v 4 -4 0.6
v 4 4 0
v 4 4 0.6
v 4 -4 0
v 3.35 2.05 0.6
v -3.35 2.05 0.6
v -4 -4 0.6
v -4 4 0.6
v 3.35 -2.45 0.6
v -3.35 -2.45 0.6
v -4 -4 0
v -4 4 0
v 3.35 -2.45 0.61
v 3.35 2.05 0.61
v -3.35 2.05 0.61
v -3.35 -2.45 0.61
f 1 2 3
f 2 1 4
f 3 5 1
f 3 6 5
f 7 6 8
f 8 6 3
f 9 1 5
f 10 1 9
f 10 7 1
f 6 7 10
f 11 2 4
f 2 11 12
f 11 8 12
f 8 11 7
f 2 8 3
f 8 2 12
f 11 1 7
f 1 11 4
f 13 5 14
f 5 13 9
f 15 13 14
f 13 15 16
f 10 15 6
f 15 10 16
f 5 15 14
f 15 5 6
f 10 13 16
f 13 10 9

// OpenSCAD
$fn=50;

color("#505050") translate([0,0,0.3]) cube([8,8,0.6], center=true);
color("lightgray") translate([0,-0.2,0.51]) cube([6.7, 4.5, 0.2], center=true);
